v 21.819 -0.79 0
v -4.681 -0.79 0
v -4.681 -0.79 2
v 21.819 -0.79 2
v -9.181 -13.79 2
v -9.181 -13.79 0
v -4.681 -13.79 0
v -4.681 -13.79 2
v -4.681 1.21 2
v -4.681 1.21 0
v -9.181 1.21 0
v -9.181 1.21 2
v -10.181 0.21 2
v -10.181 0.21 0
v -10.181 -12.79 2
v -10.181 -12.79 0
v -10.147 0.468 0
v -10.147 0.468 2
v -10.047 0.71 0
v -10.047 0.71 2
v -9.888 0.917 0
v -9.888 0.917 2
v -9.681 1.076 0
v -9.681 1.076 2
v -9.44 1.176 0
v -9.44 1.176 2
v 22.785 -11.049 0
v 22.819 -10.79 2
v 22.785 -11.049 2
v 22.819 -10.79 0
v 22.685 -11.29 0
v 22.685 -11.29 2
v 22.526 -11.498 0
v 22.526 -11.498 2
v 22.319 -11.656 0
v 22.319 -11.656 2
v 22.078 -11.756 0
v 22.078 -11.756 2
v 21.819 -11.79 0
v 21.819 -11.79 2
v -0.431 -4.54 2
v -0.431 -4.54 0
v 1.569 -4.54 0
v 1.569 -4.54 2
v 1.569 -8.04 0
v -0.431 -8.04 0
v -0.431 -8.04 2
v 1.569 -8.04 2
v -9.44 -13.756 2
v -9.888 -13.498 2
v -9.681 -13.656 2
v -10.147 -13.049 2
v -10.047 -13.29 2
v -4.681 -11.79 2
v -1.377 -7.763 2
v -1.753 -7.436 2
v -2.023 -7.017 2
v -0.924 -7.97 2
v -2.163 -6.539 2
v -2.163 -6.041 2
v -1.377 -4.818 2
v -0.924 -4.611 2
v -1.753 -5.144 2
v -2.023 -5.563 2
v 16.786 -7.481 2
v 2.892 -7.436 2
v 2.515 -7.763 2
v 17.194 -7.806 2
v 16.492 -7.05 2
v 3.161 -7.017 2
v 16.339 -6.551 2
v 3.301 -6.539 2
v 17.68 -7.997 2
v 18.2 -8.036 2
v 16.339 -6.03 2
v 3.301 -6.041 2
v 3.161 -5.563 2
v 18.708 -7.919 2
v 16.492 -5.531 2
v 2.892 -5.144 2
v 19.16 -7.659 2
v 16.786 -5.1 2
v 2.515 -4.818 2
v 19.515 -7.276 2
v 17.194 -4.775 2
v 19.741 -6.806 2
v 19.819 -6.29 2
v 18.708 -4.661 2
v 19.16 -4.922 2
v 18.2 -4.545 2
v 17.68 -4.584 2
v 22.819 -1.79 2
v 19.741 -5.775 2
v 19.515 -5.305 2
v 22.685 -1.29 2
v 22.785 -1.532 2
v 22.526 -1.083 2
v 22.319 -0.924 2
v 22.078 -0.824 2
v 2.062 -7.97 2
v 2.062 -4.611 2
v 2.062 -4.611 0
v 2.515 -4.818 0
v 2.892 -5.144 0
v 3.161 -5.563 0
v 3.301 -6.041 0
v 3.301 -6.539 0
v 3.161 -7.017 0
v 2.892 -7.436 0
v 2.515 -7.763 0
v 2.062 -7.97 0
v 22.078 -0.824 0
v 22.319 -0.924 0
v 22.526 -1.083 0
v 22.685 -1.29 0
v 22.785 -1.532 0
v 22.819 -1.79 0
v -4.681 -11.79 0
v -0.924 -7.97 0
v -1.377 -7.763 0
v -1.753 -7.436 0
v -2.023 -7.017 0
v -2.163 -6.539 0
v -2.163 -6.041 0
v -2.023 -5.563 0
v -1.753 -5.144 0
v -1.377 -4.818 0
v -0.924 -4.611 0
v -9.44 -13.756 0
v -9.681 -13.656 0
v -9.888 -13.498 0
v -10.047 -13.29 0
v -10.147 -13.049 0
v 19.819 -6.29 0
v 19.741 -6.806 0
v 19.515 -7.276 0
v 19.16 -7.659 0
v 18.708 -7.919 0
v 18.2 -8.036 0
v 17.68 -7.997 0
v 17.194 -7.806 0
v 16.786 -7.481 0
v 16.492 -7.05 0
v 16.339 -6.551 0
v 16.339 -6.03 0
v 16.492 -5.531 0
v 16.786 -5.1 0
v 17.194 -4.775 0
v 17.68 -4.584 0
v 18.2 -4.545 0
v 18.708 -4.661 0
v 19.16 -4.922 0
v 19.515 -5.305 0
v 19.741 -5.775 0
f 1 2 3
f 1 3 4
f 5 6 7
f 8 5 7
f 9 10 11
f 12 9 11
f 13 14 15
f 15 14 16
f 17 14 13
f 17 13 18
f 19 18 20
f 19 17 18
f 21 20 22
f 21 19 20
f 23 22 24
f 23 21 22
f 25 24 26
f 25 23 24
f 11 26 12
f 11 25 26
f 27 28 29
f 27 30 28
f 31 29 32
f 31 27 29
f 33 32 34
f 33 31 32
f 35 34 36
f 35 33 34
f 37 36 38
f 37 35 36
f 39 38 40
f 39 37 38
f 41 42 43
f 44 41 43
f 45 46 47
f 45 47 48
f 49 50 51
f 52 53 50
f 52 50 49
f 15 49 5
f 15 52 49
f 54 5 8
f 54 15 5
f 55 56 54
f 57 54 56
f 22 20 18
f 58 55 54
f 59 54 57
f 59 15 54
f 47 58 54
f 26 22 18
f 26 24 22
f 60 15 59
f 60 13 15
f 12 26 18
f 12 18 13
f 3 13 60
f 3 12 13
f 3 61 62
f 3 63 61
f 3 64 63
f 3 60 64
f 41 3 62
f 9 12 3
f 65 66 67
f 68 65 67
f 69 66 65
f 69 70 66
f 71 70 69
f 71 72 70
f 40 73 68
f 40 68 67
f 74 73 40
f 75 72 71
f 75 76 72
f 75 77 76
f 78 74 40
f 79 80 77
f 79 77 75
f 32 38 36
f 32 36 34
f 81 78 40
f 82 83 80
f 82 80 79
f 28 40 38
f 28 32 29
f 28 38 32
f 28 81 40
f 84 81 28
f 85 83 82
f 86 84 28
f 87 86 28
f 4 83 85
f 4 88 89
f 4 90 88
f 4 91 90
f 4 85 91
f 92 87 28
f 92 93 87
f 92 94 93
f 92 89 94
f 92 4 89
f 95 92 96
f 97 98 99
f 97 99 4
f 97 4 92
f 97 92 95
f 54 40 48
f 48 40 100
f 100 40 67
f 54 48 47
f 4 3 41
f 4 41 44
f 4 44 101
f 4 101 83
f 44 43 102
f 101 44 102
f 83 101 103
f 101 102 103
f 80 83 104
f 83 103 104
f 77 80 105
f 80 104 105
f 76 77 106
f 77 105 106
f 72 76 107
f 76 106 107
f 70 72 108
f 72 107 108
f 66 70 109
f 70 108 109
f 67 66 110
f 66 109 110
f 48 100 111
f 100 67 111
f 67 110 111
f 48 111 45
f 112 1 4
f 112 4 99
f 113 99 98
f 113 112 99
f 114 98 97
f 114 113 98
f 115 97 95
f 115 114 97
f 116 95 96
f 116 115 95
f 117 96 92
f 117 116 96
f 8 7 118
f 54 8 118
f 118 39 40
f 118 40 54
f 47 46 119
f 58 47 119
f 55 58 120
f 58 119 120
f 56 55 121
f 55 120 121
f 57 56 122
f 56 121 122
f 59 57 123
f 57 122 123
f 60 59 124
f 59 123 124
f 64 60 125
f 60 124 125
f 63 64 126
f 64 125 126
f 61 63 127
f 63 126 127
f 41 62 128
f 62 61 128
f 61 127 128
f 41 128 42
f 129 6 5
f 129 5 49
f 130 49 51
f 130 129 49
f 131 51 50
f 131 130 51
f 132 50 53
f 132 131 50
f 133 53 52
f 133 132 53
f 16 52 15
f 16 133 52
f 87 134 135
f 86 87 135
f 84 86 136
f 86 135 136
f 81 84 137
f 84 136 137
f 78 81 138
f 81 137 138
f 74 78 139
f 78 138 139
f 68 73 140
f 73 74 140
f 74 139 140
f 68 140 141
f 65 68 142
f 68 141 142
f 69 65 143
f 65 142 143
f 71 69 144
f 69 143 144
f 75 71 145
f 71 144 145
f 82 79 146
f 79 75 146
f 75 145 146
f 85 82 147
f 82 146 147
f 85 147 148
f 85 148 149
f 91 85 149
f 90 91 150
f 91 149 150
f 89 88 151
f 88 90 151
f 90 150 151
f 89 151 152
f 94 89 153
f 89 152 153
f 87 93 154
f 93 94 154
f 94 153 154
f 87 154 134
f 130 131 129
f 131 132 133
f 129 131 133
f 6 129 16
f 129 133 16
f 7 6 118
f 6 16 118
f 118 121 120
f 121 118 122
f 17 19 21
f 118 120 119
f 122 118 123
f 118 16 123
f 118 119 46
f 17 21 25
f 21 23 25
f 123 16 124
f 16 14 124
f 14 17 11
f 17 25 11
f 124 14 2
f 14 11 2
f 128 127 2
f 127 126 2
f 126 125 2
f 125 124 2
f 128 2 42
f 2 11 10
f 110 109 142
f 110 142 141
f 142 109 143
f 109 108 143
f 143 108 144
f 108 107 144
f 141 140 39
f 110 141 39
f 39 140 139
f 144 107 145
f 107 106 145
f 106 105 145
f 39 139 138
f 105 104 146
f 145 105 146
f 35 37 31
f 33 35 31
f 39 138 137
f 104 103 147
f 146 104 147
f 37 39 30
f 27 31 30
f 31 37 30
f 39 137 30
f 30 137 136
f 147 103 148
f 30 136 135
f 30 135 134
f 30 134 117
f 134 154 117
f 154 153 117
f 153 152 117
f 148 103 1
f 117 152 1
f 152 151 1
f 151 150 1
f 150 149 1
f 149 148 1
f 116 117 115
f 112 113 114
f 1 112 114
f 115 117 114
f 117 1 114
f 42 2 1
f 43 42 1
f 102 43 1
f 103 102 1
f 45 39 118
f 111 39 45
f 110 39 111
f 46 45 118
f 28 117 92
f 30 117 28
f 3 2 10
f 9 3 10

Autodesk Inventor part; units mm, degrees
ref_plane "YZ Plane" through (0, 0, 0) normal (1, 0, 0) x (0, 1, 0)
ref_plane "XZ Plane" through (0, 0, 0) normal (0, 1, 0) x (-1, 0, 0)
ref_plane "XY Plane" through (0, 0, 0) normal (0, 0, 1) x (1, 0, 0)
sketch "Эскиз1" plane through (0, 0, 0) normal (0, 0, 1) x (1, 0, 0)
  line L0 (-4.6809, -0.7904) -> (-4.6809, 1.2096)
  line L1 (-4.6809, -13.7904) -> (-4.6809, -11.7904)
  line L2 (-4.6809, 1.2096) -> (-9.1809, 1.2096)
  line L3 (-10.1809, 0.2096) -> (-10.1809, -12.7904)
  line L4 (-9.1809, -13.7904) -> (-4.6809, -13.7904)
  arc A0 (-10.1809, -12.7904) -> (-9.1809, -13.7904) centre (-9.1809, -12.7904) ccw
  arc A1 (-9.1809, 1.2096) -> (-10.1809, 0.2096) centre (-9.1809, 0.2096) ccw
  line L5 (22.8191, -1.7904) -> (22.8191, -10.7904)
  line L6 (21.8191, -11.7904) -> (-4.6809, -11.7904)
  line L7 (-4.6809, -0.7904) -> (21.8191, -0.7904)
  arc A2 (22.8191, -1.7904) -> (21.8191, -0.7904) centre (21.8191, -1.7904) ccw
  arc A3 (21.8191, -11.7904) -> (22.8191, -10.7904) centre (21.8191, -10.7904) ccw
  arc A4 (-0.4309, -4.5404) -> (-0.4309, -8.0404) centre (-0.4309, -6.2904) ccw
  arc A5 (1.5691, -8.0404) -> (1.5691, -4.5404) centre (1.5691, -6.2904) ccw
  line L8 (-0.4309, -4.5404) -> (1.5691, -4.5404)
  line L9 (-0.4309, -8.0404) -> (1.5691, -8.0404)
  circle A6 centre (18.0691, -6.2904) radius 1.75
  point P0 (0, 0)
  point P1 (-10.1809, 1.2096)
  point P2 (-10.1809, -13.7904)
  point P3 (22.8191, -0.7904)
  point P4 (22.8191, -11.7904)
extrude "Выдавливание2" add sketch "Эскиз1" along normal blind 2
properties part number "Крепеж"
